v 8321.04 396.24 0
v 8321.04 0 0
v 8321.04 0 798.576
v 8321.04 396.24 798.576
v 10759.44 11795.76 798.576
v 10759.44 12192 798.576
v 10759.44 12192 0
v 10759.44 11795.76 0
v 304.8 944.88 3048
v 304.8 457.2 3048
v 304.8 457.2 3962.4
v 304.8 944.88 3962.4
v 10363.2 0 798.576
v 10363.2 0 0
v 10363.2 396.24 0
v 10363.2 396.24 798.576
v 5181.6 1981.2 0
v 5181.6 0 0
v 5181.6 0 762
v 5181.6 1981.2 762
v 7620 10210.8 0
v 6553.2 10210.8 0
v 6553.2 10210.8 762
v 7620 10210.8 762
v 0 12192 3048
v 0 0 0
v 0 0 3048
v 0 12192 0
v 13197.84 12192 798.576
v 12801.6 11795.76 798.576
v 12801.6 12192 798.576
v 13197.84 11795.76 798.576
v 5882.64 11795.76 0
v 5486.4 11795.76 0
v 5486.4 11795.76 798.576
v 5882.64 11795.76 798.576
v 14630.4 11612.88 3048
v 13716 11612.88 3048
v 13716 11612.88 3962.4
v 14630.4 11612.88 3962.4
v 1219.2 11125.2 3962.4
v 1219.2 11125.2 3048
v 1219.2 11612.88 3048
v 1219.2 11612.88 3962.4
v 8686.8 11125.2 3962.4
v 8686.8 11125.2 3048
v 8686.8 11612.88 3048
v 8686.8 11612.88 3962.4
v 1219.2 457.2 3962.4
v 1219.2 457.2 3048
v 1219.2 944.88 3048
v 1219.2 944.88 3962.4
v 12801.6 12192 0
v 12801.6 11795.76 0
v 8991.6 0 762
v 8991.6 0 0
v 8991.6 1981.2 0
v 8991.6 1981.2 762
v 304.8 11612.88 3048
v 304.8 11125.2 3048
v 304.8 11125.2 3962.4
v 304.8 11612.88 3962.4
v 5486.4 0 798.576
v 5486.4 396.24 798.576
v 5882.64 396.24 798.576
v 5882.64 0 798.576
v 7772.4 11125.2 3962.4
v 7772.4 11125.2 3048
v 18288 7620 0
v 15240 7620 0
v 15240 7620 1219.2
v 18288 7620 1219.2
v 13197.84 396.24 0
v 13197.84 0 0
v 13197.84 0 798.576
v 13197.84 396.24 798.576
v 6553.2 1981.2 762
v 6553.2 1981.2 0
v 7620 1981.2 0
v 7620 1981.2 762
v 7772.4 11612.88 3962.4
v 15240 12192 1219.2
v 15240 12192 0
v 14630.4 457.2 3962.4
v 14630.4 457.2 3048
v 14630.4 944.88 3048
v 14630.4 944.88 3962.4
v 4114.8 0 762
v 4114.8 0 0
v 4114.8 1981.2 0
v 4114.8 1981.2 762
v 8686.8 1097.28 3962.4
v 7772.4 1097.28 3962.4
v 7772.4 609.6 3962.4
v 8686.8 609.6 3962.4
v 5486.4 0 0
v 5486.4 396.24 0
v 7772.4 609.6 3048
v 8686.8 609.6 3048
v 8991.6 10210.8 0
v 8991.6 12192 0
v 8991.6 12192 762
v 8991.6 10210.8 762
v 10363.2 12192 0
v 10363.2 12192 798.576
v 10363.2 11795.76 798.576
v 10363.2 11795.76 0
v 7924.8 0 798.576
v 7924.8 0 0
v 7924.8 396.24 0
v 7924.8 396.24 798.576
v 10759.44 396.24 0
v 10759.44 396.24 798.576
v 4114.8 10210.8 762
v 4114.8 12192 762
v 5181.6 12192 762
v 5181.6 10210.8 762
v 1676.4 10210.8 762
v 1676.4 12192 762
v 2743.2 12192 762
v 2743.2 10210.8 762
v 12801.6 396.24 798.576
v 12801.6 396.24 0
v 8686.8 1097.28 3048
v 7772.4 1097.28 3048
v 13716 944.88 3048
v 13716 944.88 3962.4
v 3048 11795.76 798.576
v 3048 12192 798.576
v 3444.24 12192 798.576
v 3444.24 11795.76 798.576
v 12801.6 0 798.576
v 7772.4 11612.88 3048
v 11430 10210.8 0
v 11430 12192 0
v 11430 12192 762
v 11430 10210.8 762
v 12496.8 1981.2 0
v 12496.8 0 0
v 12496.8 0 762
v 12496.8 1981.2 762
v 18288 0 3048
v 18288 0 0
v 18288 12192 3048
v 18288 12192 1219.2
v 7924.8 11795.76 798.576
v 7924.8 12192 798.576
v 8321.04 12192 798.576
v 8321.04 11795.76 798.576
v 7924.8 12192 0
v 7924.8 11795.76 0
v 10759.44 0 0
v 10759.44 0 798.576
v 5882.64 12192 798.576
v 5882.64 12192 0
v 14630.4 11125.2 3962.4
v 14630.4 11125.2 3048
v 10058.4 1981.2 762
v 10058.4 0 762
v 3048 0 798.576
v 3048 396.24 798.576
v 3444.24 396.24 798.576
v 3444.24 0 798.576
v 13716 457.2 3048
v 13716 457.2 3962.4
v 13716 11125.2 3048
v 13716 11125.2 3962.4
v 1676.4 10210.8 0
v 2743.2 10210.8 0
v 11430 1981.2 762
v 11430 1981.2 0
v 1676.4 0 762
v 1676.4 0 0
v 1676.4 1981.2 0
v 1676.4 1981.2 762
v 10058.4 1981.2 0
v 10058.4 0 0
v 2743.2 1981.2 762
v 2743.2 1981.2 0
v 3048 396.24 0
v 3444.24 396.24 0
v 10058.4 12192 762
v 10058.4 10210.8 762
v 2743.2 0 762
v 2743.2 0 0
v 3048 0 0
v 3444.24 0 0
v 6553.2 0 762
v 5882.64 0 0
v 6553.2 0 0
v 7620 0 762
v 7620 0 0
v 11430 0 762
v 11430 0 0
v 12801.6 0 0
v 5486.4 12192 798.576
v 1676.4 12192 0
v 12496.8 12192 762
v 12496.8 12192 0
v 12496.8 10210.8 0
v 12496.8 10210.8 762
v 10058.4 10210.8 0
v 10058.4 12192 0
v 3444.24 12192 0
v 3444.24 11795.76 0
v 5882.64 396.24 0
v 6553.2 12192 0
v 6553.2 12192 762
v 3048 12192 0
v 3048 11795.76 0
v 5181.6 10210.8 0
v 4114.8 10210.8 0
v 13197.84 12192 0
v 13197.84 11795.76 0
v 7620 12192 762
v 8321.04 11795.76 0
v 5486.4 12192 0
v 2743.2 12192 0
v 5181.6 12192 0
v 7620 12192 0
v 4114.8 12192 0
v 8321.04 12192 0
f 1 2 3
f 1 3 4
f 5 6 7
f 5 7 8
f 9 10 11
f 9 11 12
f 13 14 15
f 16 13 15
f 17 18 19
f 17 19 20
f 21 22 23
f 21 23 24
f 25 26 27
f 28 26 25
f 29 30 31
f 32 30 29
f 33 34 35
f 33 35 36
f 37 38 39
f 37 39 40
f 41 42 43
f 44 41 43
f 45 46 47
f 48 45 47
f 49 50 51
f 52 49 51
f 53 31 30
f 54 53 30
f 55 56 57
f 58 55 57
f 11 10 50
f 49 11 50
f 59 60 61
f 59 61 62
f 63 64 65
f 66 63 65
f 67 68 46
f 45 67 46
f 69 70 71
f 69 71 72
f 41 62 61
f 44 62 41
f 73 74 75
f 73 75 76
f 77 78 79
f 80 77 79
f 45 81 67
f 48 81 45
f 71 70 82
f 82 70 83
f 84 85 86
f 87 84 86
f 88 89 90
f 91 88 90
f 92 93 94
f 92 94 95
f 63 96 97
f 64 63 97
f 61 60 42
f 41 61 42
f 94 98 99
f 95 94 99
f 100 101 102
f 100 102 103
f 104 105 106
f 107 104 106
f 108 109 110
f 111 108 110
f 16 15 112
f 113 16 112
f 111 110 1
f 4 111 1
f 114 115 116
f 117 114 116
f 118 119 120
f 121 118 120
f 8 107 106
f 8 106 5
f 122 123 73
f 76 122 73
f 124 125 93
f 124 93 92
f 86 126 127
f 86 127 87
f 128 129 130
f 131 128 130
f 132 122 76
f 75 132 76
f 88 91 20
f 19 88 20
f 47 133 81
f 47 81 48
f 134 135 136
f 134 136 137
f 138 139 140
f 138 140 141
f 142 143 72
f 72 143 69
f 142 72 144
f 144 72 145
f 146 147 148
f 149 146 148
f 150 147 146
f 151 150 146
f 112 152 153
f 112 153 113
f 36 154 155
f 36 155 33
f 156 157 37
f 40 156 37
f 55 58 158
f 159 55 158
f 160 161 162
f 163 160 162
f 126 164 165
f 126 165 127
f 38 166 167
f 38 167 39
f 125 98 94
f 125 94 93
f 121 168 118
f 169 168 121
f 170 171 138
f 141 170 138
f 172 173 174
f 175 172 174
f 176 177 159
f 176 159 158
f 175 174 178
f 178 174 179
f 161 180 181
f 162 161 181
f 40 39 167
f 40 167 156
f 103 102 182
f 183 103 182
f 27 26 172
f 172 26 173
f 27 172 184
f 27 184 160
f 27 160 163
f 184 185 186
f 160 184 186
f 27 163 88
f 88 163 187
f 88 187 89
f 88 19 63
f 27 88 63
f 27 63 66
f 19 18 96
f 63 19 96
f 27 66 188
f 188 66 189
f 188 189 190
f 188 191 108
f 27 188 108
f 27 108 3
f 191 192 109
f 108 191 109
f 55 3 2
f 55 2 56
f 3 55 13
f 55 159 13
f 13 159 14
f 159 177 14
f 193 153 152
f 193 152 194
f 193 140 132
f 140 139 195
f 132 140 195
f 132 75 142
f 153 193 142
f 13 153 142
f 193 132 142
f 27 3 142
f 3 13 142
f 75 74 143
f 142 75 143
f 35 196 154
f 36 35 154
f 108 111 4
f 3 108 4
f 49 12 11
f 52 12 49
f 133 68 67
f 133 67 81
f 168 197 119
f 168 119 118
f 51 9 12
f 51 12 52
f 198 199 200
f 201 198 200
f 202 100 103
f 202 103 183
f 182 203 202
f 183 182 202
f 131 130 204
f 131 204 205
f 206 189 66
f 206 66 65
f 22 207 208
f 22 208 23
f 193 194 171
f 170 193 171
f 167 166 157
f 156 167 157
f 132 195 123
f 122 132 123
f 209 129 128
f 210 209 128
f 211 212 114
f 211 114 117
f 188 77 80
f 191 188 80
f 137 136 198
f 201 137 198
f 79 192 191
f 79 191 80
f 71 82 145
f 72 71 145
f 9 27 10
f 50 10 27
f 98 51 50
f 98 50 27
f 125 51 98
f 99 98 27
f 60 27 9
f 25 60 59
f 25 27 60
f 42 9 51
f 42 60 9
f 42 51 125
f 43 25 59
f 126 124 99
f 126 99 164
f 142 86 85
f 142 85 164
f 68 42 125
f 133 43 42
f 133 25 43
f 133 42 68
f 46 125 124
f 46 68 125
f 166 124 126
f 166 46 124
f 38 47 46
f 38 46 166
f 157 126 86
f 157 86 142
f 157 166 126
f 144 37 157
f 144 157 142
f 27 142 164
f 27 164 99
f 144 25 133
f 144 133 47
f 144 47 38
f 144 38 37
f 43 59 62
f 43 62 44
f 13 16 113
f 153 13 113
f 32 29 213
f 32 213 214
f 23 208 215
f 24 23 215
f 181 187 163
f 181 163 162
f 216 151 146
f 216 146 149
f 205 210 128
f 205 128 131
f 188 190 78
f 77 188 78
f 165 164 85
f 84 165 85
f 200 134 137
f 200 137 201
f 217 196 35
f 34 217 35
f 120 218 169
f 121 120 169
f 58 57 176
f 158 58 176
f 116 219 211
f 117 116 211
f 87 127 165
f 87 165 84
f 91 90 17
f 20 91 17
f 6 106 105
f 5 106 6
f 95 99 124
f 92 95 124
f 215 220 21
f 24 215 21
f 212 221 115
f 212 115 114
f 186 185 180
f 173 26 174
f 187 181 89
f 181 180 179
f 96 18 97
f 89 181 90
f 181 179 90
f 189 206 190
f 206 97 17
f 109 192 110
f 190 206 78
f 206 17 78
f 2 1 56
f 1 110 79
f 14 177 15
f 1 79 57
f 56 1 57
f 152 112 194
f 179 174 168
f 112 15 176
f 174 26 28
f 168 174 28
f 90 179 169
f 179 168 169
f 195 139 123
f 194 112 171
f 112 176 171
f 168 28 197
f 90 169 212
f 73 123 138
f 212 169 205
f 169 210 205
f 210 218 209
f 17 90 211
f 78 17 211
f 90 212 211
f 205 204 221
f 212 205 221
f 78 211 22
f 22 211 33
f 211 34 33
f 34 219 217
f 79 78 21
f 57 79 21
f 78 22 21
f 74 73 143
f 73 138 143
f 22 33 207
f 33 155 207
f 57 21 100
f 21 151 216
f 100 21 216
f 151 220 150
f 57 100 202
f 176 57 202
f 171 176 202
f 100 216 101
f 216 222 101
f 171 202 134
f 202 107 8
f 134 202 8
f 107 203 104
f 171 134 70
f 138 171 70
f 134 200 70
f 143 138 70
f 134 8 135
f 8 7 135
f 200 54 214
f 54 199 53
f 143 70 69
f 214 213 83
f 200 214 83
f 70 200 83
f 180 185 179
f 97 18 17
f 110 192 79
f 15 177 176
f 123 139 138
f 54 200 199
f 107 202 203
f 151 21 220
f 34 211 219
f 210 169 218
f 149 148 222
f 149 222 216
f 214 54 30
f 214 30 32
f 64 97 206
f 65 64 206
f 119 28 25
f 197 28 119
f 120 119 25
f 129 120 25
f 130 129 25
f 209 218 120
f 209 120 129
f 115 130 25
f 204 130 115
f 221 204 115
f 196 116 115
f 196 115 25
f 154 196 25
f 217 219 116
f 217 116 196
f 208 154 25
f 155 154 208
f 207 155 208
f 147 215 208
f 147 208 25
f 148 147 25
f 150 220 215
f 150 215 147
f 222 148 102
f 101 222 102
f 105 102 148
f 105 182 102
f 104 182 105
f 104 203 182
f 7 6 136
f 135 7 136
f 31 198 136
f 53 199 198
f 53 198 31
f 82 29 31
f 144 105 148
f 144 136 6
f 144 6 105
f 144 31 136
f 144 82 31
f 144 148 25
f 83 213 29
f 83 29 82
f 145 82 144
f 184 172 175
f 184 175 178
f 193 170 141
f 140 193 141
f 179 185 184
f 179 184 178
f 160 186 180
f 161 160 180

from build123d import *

# Parameters (mm, degrees)
BOX006_W     = 1066.8
BOX006_H     = 1981.2
BOX006_DEPTH = 762
BOX005_W     = 396.24
BOX005_H     = 396.24
BOX005_DEPTH = 798.576
BOX007_W     = 1066.8
BOX007_H     = 1981.2
BOX007_DEPTH = 762
BOX008_W     = 396.24
BOX008_H     = 396.24
BOX008_DEPTH = 798.576
BOX010_W     = 1066.8
BOX010_H     = 1981.2
BOX010_DEPTH = 762
BOX009_W     = 396.24
BOX009_H     = 396.24
BOX009_DEPTH = 798.576
BOX001_W     = 1066.8
BOX001_H     = 1981.2
BOX001_DEPTH = 762
BOX002_W     = 396.24
BOX002_H     = 396.24
BOX002_DEPTH = 798.576
BOX003_W     = 1066.8
BOX003_H     = 1981.2
BOX003_DEPTH = 762
BOX004_W     = 396.24
BOX004_H     = 396.24
BOX004_DEPTH = 798.576
BOX011_W     = 3048
BOX011_H     = 4572
BOX011_DEPTH = 1219.2
BOX014_W     = 914.4
BOX014_H     = 487.68
BOX014_DEPTH = 1219.2
BOX015_W     = 914.4
BOX015_H     = 487.68
BOX015_DEPTH = 1219.2
BOX018_W     = 914.4
BOX018_H     = 487.68
BOX018_DEPTH = 1219.2
BOX019_W     = 914.4
BOX019_H     = 487.68
BOX019_DEPTH = 1219.2
BOX020_W     = 914.4
BOX020_H     = 487.68
BOX020_DEPTH = 1219.2
BOX021_W     = 914.4
BOX021_H     = 487.68
BOX021_DEPTH = 1219.2
BOX_W        = 18288
BOX_H        = 12192
BOX_DEPTH    = 3048


with BuildPart() as box006:
    # Box006 → Box006 (new body)
    with BuildSketch(Plane.XY):
        with Locations((533.4, 990.6)):
            Rectangle(BOX006_W, BOX006_H)
    extrude(amount=BOX006_DEPTH)


with BuildPart() as fusion002:
    # Box005 → Box005 (new body)
    with BuildSketch(Plane(origin=(1371.6, 0, 0), x_dir=(1, 0, 0), z_dir=(0, 0, 1))):
        with Locations((198.12, 198.12)):
            Rectangle(BOX005_W, BOX005_H)
    extrude(amount=BOX005_DEPTH)

    # Fusion002: union Box006
    add(box006.part)


with BuildPart() as fusion002_1:
    # Fusion002 placement: moved
    add(fusion002.part.moved(Location((4876.8, 0, 0))))


with BuildPart() as box007:
    # Box007 → Box007 (new body)
    with BuildSketch(Plane.XY):
        with Locations((533.4, 990.6)):
            Rectangle(BOX007_W, BOX007_H)
    extrude(amount=BOX007_DEPTH)


with BuildPart() as fusion003:
    # Box008 → Box008 (new body)
    with BuildSketch(Plane(origin=(1371.6, 0, 0), x_dir=(1, 0, 0), z_dir=(0, 0, 1))):
        with Locations((198.12, 198.12)):
            Rectangle(BOX008_W, BOX008_H)
    extrude(amount=BOX008_DEPTH)

    # Fusion003: union Box007
    add(box007.part)


with BuildPart() as fusion003_1:
    # Fusion003 placement: moved
    add(fusion003.part.moved(Location((7315.2, 0, 0))))


with BuildPart() as box010:
    # Box010 → Box010 (new body)
    with BuildSketch(Plane.XY):
        with Locations((533.4, 990.6)):
            Rectangle(BOX010_W, BOX010_H)
    extrude(amount=BOX010_DEPTH)


with BuildPart() as fusion004:
    # Box009 → Box009 (new body)
    with BuildSketch(Plane(origin=(1371.6, 0, 0), x_dir=(1, 0, 0), z_dir=(0, 0, 1))):
        with Locations((198.12, 198.12)):
            Rectangle(BOX009_W, BOX009_H)
    extrude(amount=BOX009_DEPTH)

    # Fusion004: union Box010
    add(box010.part)


with BuildPart() as fusion004_1:
    # Fusion004 placement: moved
    add(fusion004.part.moved(Location((9753.6, 0, 0))))


with BuildPart() as box001:
    # Box001 → Box001 (new body)
    with BuildSketch(Plane.XY):
        with Locations((533.4, 990.6)):
            Rectangle(BOX001_W, BOX001_H)
    extrude(amount=BOX001_DEPTH)


with BuildPart() as fusion:
    # Box002 → Box002 (new body)
    with BuildSketch(Plane(origin=(1371.6, 0, 0), x_dir=(1, 0, 0), z_dir=(0, 0, 1))):
        with Locations((198.12, 198.12)):
            Rectangle(BOX002_W, BOX002_H)
    extrude(amount=BOX002_DEPTH)

    # Fusion: union Box001
    add(box001.part)


with BuildPart() as box003:
    # Box003 → Box003 (new body)
    with BuildSketch(Plane.XY):
        with Locations((533.4, 990.6)):
            Rectangle(BOX003_W, BOX003_H)
    extrude(amount=BOX003_DEPTH)


with BuildPart() as right_beds:
    # Box004 → Box004 (new body)
    with BuildSketch(Plane(origin=(1371.6, 0, 0), x_dir=(1, 0, 0), z_dir=(0, 0, 1))):
        with Locations((198.12, 198.12)):
            Rectangle(BOX004_W, BOX004_H)
    extrude(amount=BOX004_DEPTH)

    # Fusion001: union Box003
    add(box003.part)


with BuildPart() as right_beds_1:
    # Fusion001 placement: moved
    add(right_beds.part.moved(Location((2438.4, 0, 0))))

    # Fusion005: union Fusion002, Fusion003, Fusion004, Fusion
    add(fusion002_1.part)
    add(fusion003_1.part)
    add(fusion004_1.part)
    add(fusion.part)


with BuildPart() as all_beds:
    # Part__Mirroring: instance of right beds
    add(right_beds_1.part.mirror(Plane(origin=(0, 6096, 0), x_dir=(1, 0, 0), z_dir=(0, 1, 0))))

    # Fusion006: union right beds
    add(right_beds_1.part)


with BuildPart() as all_beds_1:
    # Fusion006 placement: moved
    add(all_beds.part.moved(Location((1676.4, 0, 0))))


with BuildPart() as surfaces:
    # Box011 → Box011 (new body)
    with BuildSketch(Plane(origin=(15240, 7620, 0), x_dir=(1, 0, 0), z_dir=(0, 0, 1))):
        with Locations((1524, 2286)):
            Rectangle(BOX011_W, BOX011_H)
    extrude(amount=BOX011_DEPTH)

    # Fusion008: union all beds
    add(all_beds_1.part)


with BuildPart() as box014:
    # Box014 → Box014 (new body)
    with BuildSketch(Plane(origin=(13716, 11125.2, 2743.2), x_dir=(1, 0, 0), z_dir=(0, 0, 1))):
        with Locations((457.2, 243.84)):
            Rectangle(BOX014_W, BOX014_H)
    extrude(amount=BOX014_DEPTH)


with BuildPart() as box015:
    # Box015 → Box015 (new body)
    with BuildSketch(Plane(origin=(13716, 457.2, 2743.2), x_dir=(1, 0, 0), z_dir=(0, 0, 1))):
        with Locations((457.2, 243.84)):
            Rectangle(BOX015_W, BOX015_H)
    extrude(amount=BOX015_DEPTH)


with BuildPart() as box018:
    # Box018 → Box018 (new body)
    with BuildSketch(Plane(origin=(304.8, 457.2, 2743.2), x_dir=(1, 0, 0), z_dir=(0, 0, 1))):
        with Locations((457.2, 243.84)):
            Rectangle(BOX018_W, BOX018_H)
    extrude(amount=BOX018_DEPTH)


with BuildPart() as box019:
    # Box019 → Box019 (new body)
    with BuildSketch(Plane(origin=(304.8, 11125.2, 2743.2), x_dir=(1, 0, 0), z_dir=(0, 0, 1))):
        with Locations((457.2, 243.84)):
            Rectangle(BOX019_W, BOX019_H)
    extrude(amount=BOX019_DEPTH)


with BuildPart() as box020:
    # Box020 → Box020 (new body)
    with BuildSketch(Plane(origin=(7772.4, 11125.2, 2743.2), x_dir=(1, 0, 0), z_dir=(0, 0, 1))):
        with Locations((457.2, 243.84)):
            Rectangle(BOX020_W, BOX020_H)
    extrude(amount=BOX020_DEPTH)


with BuildPart() as fusion009:
    # Box021 → Box021 (new body)
    with BuildSketch(Plane(origin=(7772.4, 609.6, 2743.2), x_dir=(1, 0, 0), z_dir=(0, 0, 1))):
        with Locations((457.2, 243.84)):
            Rectangle(BOX021_W, BOX021_H)
    extrude(amount=BOX021_DEPTH)

    # Fusion009: union Box014, Box015, Box018, Box019, Box020
    add(box014.part)
    add(box015.part)
    add(box018.part)
    add(box019.part)
    add(box020.part)


with BuildPart() as cut:
    # Box → Box (new body)
    with BuildSketch(Plane.XY):
        with Locations((9144, 6096)):
            Rectangle(BOX_W, BOX_H)
    extrude(amount=BOX_DEPTH)

    # Fusion010: union Fusion009
    add(fusion009.part)

    # Cut: cut surfaces
    add(surfaces.part, mode=Mode.SUBTRACT)


solid = cut.part
